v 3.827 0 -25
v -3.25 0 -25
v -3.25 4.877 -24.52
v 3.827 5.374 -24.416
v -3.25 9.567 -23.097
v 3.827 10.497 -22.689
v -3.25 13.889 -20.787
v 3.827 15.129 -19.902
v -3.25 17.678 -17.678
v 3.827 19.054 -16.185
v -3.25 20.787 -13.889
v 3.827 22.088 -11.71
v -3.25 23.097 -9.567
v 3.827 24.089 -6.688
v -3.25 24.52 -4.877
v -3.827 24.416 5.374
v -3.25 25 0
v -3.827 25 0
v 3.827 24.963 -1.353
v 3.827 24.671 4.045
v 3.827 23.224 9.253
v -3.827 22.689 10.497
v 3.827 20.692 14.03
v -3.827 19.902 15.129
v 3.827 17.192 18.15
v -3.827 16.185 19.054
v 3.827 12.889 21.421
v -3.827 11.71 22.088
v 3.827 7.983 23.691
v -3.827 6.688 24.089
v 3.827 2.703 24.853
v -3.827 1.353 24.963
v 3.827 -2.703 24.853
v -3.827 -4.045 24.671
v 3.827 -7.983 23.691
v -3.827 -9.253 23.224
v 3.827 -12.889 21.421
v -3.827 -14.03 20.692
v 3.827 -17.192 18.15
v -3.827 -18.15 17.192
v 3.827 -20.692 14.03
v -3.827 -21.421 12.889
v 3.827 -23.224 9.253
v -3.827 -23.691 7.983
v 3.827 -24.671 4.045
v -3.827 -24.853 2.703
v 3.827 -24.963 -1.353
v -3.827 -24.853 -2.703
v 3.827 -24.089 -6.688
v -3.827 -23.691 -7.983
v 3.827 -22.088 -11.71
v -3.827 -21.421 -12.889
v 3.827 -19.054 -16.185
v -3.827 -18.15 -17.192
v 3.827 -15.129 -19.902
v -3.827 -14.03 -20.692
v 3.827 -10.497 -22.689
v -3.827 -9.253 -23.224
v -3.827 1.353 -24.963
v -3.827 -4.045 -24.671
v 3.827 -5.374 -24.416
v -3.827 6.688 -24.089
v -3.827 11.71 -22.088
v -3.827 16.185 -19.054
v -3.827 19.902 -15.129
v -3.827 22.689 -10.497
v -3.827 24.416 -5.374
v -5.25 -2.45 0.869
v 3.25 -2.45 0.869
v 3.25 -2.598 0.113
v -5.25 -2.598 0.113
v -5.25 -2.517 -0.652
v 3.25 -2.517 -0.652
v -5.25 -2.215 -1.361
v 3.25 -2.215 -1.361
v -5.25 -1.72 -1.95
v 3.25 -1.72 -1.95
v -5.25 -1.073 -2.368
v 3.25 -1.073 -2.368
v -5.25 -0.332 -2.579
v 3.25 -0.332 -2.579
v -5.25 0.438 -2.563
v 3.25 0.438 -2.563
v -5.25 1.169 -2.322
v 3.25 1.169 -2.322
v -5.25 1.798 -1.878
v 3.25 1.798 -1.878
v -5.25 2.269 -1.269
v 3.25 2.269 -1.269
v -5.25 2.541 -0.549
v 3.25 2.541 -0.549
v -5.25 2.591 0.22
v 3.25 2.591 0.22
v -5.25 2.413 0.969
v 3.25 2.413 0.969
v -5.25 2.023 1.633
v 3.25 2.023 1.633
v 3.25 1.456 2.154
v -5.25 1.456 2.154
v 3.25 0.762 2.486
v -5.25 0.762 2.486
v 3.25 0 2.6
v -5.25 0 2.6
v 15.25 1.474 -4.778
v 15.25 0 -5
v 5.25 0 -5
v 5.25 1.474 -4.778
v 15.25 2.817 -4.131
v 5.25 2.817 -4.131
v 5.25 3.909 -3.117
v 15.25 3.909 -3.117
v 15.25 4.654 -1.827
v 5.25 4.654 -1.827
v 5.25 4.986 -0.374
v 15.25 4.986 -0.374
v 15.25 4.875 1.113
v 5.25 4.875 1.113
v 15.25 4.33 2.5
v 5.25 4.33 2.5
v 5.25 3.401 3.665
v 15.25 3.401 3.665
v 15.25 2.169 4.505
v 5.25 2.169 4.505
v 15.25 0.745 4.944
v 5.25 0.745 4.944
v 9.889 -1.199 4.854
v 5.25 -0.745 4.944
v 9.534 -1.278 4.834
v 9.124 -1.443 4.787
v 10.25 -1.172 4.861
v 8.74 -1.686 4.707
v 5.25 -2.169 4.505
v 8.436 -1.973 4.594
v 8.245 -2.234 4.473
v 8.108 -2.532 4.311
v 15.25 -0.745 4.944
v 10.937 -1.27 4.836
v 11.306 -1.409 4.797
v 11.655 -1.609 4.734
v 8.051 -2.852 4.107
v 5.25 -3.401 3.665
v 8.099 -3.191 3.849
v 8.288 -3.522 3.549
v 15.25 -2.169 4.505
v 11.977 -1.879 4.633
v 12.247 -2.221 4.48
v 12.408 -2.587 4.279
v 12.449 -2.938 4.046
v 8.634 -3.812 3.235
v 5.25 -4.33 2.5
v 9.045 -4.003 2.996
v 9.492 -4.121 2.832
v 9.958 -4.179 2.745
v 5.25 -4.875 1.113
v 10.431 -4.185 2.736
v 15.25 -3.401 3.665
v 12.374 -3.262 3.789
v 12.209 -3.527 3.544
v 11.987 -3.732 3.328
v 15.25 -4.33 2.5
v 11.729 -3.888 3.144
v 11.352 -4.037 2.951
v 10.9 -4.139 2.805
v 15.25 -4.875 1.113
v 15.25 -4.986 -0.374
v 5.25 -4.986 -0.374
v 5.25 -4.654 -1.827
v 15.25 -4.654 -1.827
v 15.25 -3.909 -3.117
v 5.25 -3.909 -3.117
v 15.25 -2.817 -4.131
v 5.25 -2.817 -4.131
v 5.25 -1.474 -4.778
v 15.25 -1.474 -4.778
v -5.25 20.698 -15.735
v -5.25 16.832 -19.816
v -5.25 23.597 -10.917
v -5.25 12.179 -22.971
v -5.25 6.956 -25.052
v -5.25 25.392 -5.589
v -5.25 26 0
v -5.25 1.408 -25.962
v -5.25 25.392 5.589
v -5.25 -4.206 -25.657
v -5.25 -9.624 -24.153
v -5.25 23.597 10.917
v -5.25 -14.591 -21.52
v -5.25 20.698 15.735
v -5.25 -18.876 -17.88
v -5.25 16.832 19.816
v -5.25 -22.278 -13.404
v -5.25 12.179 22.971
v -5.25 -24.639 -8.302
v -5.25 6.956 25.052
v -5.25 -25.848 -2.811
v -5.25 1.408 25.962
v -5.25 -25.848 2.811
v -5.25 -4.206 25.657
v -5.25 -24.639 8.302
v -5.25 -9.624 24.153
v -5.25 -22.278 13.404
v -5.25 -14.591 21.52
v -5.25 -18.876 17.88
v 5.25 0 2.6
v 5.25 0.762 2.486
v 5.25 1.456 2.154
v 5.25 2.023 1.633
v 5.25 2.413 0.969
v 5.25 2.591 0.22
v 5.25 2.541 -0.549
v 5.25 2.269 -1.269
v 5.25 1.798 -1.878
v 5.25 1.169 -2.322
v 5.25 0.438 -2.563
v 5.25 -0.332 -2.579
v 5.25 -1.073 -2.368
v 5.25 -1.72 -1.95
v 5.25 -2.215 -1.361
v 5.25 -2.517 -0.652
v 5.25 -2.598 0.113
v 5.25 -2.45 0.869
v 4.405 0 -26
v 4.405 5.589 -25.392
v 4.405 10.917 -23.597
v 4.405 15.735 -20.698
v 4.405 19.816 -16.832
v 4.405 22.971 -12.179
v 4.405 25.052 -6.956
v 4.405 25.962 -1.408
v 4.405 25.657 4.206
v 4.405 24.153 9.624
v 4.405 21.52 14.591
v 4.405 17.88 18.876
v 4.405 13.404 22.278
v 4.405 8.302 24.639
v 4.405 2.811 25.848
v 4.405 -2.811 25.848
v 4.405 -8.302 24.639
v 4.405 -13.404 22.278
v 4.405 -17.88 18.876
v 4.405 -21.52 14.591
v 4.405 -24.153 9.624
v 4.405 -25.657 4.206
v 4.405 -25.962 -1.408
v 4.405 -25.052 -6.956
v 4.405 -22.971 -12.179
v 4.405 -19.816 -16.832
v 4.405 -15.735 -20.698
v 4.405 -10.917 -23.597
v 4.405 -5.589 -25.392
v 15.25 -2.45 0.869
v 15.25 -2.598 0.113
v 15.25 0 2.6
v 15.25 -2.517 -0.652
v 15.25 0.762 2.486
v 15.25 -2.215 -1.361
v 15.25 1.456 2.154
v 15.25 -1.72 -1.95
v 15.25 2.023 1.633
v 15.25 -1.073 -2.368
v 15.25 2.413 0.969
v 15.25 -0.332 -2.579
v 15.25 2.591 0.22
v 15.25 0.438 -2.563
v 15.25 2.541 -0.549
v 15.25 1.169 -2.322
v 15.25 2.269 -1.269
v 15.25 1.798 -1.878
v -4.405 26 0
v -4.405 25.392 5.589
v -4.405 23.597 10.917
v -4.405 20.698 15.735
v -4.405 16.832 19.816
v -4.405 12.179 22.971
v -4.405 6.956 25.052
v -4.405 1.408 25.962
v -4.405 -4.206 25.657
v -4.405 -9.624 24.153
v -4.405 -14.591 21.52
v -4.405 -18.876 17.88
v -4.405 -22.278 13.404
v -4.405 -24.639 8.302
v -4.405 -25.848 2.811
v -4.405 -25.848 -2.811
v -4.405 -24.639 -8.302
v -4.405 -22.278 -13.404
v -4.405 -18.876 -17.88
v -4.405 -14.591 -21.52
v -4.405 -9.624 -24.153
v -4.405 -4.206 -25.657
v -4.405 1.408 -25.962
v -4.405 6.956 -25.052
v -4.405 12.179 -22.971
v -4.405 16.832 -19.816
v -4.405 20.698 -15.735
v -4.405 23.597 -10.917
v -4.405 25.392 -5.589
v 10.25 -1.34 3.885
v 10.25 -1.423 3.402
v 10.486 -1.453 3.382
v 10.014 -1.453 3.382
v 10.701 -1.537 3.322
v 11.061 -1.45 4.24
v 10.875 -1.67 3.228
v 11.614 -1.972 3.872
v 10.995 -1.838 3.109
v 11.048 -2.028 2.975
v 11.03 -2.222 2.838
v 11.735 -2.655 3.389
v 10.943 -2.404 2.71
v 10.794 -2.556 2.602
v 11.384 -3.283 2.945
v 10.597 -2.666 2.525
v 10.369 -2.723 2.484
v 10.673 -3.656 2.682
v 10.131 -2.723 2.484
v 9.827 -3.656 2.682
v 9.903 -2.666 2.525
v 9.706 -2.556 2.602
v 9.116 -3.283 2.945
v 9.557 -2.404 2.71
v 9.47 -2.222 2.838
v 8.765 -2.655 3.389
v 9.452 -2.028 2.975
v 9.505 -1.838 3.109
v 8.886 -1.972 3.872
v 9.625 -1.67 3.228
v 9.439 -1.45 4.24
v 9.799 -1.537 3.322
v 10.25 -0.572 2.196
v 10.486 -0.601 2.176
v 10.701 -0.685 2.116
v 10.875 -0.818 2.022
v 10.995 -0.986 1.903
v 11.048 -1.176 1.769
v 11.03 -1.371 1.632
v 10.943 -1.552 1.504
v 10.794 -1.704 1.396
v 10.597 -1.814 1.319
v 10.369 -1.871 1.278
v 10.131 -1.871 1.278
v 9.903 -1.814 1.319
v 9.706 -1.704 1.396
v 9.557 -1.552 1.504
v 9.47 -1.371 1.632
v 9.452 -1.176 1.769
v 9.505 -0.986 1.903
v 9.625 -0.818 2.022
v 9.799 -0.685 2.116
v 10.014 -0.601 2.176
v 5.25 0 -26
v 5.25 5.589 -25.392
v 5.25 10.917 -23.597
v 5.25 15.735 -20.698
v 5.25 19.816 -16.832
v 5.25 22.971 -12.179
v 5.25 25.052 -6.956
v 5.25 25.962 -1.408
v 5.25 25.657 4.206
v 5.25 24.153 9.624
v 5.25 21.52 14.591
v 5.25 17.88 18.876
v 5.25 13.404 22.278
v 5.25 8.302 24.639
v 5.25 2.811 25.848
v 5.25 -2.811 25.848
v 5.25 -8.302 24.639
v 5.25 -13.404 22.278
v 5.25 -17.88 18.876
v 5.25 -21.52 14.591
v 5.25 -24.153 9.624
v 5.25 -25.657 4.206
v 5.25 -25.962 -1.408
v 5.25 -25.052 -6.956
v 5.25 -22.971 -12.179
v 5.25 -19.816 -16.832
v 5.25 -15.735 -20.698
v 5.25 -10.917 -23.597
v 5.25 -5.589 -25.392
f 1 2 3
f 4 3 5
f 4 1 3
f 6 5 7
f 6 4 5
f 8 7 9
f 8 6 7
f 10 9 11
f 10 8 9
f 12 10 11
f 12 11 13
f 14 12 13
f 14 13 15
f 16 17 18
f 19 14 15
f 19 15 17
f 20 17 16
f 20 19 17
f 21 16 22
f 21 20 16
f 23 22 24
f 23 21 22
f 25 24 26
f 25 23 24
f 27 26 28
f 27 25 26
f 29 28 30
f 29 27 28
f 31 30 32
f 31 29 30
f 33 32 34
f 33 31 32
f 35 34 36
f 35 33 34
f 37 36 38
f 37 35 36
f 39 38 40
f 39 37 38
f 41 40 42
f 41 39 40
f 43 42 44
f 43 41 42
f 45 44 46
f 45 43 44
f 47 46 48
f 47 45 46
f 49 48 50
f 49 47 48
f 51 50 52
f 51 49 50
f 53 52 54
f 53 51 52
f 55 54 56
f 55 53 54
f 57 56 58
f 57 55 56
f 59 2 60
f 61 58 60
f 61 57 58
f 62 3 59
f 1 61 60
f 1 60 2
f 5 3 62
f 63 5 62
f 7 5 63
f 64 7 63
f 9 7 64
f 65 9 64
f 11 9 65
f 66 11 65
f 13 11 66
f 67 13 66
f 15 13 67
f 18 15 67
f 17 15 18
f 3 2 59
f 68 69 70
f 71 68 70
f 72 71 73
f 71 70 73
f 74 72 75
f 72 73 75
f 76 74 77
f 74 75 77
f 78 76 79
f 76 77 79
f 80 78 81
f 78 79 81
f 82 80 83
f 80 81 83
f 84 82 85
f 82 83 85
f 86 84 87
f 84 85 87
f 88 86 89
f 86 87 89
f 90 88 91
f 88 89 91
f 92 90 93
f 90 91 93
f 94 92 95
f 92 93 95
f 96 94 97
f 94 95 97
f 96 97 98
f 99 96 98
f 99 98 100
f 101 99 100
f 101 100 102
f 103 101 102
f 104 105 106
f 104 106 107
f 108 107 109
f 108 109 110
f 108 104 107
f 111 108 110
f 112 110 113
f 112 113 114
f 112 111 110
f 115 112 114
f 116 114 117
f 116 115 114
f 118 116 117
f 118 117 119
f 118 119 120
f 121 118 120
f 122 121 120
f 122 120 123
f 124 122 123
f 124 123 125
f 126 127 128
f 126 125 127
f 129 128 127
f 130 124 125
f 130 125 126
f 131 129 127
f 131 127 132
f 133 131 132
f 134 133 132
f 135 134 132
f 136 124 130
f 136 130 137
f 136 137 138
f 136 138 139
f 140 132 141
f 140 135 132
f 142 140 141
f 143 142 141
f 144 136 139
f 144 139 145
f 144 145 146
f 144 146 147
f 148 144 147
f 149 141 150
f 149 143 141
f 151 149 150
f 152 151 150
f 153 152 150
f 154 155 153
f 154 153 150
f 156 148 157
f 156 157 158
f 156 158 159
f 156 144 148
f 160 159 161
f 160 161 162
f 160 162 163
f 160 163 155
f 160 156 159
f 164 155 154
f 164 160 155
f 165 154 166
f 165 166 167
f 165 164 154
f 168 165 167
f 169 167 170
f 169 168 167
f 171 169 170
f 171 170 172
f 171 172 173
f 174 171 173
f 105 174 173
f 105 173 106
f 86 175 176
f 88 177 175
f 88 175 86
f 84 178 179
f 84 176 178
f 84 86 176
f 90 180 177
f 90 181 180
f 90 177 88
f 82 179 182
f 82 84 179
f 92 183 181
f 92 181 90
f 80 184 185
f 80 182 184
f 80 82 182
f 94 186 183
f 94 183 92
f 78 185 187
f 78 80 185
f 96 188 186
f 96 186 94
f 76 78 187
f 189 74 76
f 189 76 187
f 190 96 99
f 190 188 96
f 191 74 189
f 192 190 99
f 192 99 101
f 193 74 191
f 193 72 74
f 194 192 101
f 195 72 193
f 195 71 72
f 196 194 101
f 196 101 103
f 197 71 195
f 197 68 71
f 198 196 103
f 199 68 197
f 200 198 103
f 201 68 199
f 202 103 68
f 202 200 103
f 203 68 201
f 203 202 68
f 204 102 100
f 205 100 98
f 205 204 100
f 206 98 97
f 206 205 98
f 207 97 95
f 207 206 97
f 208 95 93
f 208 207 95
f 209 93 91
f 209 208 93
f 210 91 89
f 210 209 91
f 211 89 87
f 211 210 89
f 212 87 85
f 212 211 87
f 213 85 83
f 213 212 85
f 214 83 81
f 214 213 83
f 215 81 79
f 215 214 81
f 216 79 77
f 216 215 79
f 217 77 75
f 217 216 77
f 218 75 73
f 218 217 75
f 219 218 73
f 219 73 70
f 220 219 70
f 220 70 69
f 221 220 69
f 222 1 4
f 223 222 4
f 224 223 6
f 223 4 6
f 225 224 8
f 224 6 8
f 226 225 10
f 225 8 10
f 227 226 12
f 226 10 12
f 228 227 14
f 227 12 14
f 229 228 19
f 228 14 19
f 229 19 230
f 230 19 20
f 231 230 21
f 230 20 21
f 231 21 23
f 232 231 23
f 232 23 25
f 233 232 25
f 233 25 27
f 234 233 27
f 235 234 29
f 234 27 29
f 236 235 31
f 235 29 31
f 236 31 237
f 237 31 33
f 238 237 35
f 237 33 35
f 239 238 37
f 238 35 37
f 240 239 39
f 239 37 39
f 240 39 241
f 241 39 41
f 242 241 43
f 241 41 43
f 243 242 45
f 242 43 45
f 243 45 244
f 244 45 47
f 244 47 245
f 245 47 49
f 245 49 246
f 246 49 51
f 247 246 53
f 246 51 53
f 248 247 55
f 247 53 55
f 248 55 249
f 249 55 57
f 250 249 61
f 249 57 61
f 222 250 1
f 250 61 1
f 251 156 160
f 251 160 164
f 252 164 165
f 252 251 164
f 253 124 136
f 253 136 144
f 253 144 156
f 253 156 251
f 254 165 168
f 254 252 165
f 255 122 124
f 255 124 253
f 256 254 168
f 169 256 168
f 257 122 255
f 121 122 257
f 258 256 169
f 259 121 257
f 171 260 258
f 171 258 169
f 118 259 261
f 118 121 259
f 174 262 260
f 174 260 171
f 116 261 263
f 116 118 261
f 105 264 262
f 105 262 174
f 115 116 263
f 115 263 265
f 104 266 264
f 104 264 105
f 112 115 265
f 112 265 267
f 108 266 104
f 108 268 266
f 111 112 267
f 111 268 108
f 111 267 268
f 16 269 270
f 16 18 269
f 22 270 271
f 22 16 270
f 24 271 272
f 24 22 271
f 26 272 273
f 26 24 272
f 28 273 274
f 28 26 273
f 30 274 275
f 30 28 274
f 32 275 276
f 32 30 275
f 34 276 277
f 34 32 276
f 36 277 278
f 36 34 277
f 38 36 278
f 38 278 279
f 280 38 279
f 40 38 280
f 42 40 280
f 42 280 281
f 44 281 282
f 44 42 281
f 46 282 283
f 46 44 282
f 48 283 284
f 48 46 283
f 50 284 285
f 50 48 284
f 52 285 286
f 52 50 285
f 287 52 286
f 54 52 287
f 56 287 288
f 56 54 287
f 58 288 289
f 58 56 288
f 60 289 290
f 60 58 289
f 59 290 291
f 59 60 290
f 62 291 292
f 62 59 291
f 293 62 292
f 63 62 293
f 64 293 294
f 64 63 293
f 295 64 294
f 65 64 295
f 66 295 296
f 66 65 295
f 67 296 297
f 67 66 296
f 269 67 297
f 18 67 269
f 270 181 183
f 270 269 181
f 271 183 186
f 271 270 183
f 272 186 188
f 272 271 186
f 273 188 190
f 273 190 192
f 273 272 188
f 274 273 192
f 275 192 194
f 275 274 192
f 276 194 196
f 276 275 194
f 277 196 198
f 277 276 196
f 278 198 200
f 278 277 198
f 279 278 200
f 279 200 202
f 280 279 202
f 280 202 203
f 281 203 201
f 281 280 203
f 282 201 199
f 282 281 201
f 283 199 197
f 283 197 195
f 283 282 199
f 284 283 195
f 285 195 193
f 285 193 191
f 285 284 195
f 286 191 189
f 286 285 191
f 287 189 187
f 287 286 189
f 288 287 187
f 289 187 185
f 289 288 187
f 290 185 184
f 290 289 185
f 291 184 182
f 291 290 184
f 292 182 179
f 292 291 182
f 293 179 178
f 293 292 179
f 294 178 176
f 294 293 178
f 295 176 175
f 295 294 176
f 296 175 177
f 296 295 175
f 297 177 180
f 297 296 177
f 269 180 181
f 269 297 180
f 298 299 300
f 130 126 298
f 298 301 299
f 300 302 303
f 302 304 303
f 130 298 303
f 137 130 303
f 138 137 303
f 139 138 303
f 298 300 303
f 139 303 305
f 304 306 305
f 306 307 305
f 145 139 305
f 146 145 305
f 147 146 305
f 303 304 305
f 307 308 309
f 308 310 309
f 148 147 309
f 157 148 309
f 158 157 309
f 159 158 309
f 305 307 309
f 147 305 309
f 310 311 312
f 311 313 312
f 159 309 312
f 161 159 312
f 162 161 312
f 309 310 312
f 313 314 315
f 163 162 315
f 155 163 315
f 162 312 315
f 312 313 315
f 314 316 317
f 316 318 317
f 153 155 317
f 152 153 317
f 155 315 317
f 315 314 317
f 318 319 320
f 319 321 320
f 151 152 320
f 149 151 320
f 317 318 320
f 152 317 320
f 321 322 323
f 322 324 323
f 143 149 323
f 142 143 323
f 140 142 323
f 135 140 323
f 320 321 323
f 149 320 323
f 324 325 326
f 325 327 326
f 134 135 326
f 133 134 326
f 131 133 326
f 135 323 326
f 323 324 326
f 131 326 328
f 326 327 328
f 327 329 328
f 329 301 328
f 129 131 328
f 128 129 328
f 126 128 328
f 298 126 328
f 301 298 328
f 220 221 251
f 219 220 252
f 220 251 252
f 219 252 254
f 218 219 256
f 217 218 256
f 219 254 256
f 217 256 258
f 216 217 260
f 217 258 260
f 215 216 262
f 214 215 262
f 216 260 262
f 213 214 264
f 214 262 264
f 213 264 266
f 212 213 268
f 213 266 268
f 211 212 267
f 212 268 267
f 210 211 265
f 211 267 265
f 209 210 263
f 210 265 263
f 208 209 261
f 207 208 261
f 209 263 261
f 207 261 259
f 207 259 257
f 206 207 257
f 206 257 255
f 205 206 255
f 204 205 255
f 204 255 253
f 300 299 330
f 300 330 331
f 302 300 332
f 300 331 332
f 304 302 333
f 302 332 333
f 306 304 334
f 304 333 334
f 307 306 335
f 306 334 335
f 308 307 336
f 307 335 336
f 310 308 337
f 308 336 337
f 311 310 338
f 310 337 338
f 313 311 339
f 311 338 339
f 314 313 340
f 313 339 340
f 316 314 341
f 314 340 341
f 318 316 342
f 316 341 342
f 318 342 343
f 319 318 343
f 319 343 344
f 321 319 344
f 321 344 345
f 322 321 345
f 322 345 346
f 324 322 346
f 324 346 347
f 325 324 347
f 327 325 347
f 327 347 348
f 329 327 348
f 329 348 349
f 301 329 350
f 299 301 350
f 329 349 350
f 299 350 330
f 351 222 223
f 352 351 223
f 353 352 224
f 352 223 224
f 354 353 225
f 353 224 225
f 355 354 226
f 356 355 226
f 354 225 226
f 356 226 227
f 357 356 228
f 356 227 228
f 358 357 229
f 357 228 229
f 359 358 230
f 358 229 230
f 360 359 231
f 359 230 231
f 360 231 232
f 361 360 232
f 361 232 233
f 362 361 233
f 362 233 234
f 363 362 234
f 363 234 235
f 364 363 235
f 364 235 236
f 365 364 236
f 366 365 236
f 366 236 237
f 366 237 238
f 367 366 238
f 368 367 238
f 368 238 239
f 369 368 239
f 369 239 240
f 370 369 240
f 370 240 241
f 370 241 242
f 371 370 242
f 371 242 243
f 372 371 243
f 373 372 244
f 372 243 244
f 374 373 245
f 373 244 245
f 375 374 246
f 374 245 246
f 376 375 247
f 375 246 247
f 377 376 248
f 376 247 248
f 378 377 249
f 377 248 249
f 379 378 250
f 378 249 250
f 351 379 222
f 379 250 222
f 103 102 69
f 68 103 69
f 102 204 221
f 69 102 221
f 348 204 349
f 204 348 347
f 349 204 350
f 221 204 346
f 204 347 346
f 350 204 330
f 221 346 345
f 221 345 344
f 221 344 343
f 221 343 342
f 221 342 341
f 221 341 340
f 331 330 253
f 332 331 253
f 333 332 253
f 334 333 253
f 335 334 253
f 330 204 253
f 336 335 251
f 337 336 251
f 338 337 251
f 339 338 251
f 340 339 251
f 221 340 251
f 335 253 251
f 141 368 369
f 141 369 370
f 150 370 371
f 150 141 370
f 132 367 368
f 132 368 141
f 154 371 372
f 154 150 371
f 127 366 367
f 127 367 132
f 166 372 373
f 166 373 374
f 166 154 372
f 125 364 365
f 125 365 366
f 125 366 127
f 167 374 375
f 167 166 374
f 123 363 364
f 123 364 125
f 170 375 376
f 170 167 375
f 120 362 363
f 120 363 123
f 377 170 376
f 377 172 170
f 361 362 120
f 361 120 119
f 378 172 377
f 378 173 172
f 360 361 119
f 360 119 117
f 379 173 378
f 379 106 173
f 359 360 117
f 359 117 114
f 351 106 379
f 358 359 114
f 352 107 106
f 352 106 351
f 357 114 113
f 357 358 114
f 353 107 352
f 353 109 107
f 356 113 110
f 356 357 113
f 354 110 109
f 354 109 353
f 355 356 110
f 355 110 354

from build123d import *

# Parameters (mm, degrees)
SKETCH1_R                                       = 25
BOSS_EXTRUDE1_DEPTH                             = 3.25
SKETCH2_R                                       = 26
BOSS_EXTRUDE2_DEPTH                             = 2
CUT_EXTRUDE1_DEPTH                              = 38.739236876
BOSS_EXTRUDE3_START                             = 10
SKETCH6_R                                       = 5
BOSS_EXTRUDE3_DEPTH                             = 10
CSK_FOR_M2_FLAT_HEAD_MACHINE_SCREW1_D           = 1.6
CSK_FOR_M2_FLAT_HEAD_MACHINE_SCREW1_DEPTH       = 5
CSK_FOR_M2_FLAT_HEAD_MACHINE_SCREW1_CSINK_D     = 4.4
CSK_FOR_M2_FLAT_HEAD_MACHINE_SCREW1_CSINK_ANGLE = 90
CSK_FOR_M2_FLAT_HEAD_MACHINE_SCREW1_TIP         = 0.480688495
CHAMFER3_SIZE                                   = 1.154700538
CHAMFER3_SIZE_2                                 = 2
CUT_EXTRUDE2_DEPTH                              = 10


# Read off the part's stored shape, not the designer's step: Mirror6
with BuildPart() as part:
    # Sketch1 → Boss-Extrude1 (new, symmetric)
    with BuildSketch(Plane(origin=(0, 0, 0), x_dir=(0, 0, -1), z_dir=(1, 0, 0))):
        Circle(SKETCH1_R)
    extrude(amount=BOSS_EXTRUDE1_DEPTH, both=True)

    # Sketch2 → Boss-Extrude2 (add)
    with BuildSketch(Plane(origin=(3.25, 0, 0), x_dir=(0, 0, -1), z_dir=(1, 0, 0))):
        Circle(SKETCH2_R)
    extrude(amount=BOSS_EXTRUDE2_DEPTH)

    # Sketch3 → Cut-Extrude1 (cut, symmetric)
    with BuildSketch(Plane(origin=(5.25, 0, 0), x_dir=(0, 0, -1), z_dir=(1, 0, 0))):
        with BuildLine():
            Line((-0.869230769, -2.450395452), (-2.6, 0))
            ThreePointArc((-2.6, 0), (2.123676058, 1.5), (-0.869230769, -2.450395452))
        make_face()
    extrude(amount=CUT_EXTRUDE1_DEPTH, both=True, mode=Mode.SUBTRACT)

    # Sketch6 → Boss-Extrude3 (add)
    with BuildSketch(Plane(origin=(5.25, 0, 0), x_dir=(0, 0, -1), z_dir=(1, 0, 0)).offset(BOSS_EXTRUDE3_START)):
        Circle(SKETCH6_R)
        with BuildLine():
            Line((-2.6, 0), (-0.869230769, -2.450395452))
            ThreePointArc((-0.869230769, -2.450395452), (2.123676058, 1.5), (-2.6, 0))
        make_face(mode=Mode.SUBTRACT)
    extrude(amount=-BOSS_EXTRUDE3_DEPTH)

    # CSK for M2 Flat Head Machine Screw1
    with Locations(Plane(origin=(0, -2.884615385, 4.08399242), x_dir=(0, -0.8167984839075115, -0.576923076923077), z_dir=(0, -0.576923076923077, 0.8167984839075115))):
        with Locations((0, 10.25)):
            CounterSinkHole(CSK_FOR_M2_FLAT_HEAD_MACHINE_SCREW1_D / 2, CSK_FOR_M2_FLAT_HEAD_MACHINE_SCREW1_CSINK_D / 2, depth=CSK_FOR_M2_FLAT_HEAD_MACHINE_SCREW1_DEPTH, counter_sink_angle=CSK_FOR_M2_FLAT_HEAD_MACHINE_SCREW1_CSINK_ANGLE)
            with Locations((0, 0, -(CSK_FOR_M2_FLAT_HEAD_MACHINE_SCREW1_DEPTH + CSK_FOR_M2_FLAT_HEAD_MACHINE_SCREW1_TIP / 2))):  # 118° drill point
                Cone(0, CSK_FOR_M2_FLAT_HEAD_MACHINE_SCREW1_D / 2, CSK_FOR_M2_FLAT_HEAD_MACHINE_SCREW1_TIP, mode=Mode.SUBTRACT)

    # Chamfer3
    # the kernel refuses this chamfer: 2, 1.154700538 mm, written as the material it takes off along each edge
    with BuildSketch(Plane(origin=(3.25, 0, 0), x_dir=(0, 0, -1), z_dir=(0, -1, 0))) as chamfer3_piece_1_section:
        Polygon((26, CHAMFER3_SIZE), (26 - CHAMFER3_SIZE_2, 0), (26, 0), align=None)
    chamfer3_piece_1 = revolve(axis=Axis((3.25, 0, 0), (1, 0, 0)), mode=Mode.PRIVATE)
    chamfer3_piece_1 = chamfer3_piece_1 - Plane(origin=(4.089516227, 0, 0), x_dir=(0, 0, -1), z_dir=(1, 0, 0)) * Cylinder(25, 105, mode=Mode.PRIVATE)
    add(chamfer3_piece_1, mode=Mode.SUBTRACT)

    # Mirror6 outline → Mirror6 (revolve)
    with BuildSketch(Plane.YX):
        Polygon((26, -5.25), (26, -4.404700538), (25, -3.827350269), (25, -3.25), (2.6, -3.25), (2.6, 3.25), (0, 3.25), (0, -5.25), align=None)
    revolve(axis=Axis((0, 0, 0), (1, 0, 0)))

    # Sketch12 → Cut-Extrude2 (cut)
    with BuildSketch(Plane(origin=(3.25, 0, 0), x_dir=(0, 0, -1), z_dir=(1, 0, 0))):
        with BuildLine():
            Line((-2.6, 0), (-0.869230769, -2.450395452))
            ThreePointArc((-0.869230769, -2.450395452), (2.123676058, 1.5), (-2.6, 0))
        make_face()
    extrude(amount=-CUT_EXTRUDE2_DEPTH, mode=Mode.SUBTRACT)


solid = part.part
